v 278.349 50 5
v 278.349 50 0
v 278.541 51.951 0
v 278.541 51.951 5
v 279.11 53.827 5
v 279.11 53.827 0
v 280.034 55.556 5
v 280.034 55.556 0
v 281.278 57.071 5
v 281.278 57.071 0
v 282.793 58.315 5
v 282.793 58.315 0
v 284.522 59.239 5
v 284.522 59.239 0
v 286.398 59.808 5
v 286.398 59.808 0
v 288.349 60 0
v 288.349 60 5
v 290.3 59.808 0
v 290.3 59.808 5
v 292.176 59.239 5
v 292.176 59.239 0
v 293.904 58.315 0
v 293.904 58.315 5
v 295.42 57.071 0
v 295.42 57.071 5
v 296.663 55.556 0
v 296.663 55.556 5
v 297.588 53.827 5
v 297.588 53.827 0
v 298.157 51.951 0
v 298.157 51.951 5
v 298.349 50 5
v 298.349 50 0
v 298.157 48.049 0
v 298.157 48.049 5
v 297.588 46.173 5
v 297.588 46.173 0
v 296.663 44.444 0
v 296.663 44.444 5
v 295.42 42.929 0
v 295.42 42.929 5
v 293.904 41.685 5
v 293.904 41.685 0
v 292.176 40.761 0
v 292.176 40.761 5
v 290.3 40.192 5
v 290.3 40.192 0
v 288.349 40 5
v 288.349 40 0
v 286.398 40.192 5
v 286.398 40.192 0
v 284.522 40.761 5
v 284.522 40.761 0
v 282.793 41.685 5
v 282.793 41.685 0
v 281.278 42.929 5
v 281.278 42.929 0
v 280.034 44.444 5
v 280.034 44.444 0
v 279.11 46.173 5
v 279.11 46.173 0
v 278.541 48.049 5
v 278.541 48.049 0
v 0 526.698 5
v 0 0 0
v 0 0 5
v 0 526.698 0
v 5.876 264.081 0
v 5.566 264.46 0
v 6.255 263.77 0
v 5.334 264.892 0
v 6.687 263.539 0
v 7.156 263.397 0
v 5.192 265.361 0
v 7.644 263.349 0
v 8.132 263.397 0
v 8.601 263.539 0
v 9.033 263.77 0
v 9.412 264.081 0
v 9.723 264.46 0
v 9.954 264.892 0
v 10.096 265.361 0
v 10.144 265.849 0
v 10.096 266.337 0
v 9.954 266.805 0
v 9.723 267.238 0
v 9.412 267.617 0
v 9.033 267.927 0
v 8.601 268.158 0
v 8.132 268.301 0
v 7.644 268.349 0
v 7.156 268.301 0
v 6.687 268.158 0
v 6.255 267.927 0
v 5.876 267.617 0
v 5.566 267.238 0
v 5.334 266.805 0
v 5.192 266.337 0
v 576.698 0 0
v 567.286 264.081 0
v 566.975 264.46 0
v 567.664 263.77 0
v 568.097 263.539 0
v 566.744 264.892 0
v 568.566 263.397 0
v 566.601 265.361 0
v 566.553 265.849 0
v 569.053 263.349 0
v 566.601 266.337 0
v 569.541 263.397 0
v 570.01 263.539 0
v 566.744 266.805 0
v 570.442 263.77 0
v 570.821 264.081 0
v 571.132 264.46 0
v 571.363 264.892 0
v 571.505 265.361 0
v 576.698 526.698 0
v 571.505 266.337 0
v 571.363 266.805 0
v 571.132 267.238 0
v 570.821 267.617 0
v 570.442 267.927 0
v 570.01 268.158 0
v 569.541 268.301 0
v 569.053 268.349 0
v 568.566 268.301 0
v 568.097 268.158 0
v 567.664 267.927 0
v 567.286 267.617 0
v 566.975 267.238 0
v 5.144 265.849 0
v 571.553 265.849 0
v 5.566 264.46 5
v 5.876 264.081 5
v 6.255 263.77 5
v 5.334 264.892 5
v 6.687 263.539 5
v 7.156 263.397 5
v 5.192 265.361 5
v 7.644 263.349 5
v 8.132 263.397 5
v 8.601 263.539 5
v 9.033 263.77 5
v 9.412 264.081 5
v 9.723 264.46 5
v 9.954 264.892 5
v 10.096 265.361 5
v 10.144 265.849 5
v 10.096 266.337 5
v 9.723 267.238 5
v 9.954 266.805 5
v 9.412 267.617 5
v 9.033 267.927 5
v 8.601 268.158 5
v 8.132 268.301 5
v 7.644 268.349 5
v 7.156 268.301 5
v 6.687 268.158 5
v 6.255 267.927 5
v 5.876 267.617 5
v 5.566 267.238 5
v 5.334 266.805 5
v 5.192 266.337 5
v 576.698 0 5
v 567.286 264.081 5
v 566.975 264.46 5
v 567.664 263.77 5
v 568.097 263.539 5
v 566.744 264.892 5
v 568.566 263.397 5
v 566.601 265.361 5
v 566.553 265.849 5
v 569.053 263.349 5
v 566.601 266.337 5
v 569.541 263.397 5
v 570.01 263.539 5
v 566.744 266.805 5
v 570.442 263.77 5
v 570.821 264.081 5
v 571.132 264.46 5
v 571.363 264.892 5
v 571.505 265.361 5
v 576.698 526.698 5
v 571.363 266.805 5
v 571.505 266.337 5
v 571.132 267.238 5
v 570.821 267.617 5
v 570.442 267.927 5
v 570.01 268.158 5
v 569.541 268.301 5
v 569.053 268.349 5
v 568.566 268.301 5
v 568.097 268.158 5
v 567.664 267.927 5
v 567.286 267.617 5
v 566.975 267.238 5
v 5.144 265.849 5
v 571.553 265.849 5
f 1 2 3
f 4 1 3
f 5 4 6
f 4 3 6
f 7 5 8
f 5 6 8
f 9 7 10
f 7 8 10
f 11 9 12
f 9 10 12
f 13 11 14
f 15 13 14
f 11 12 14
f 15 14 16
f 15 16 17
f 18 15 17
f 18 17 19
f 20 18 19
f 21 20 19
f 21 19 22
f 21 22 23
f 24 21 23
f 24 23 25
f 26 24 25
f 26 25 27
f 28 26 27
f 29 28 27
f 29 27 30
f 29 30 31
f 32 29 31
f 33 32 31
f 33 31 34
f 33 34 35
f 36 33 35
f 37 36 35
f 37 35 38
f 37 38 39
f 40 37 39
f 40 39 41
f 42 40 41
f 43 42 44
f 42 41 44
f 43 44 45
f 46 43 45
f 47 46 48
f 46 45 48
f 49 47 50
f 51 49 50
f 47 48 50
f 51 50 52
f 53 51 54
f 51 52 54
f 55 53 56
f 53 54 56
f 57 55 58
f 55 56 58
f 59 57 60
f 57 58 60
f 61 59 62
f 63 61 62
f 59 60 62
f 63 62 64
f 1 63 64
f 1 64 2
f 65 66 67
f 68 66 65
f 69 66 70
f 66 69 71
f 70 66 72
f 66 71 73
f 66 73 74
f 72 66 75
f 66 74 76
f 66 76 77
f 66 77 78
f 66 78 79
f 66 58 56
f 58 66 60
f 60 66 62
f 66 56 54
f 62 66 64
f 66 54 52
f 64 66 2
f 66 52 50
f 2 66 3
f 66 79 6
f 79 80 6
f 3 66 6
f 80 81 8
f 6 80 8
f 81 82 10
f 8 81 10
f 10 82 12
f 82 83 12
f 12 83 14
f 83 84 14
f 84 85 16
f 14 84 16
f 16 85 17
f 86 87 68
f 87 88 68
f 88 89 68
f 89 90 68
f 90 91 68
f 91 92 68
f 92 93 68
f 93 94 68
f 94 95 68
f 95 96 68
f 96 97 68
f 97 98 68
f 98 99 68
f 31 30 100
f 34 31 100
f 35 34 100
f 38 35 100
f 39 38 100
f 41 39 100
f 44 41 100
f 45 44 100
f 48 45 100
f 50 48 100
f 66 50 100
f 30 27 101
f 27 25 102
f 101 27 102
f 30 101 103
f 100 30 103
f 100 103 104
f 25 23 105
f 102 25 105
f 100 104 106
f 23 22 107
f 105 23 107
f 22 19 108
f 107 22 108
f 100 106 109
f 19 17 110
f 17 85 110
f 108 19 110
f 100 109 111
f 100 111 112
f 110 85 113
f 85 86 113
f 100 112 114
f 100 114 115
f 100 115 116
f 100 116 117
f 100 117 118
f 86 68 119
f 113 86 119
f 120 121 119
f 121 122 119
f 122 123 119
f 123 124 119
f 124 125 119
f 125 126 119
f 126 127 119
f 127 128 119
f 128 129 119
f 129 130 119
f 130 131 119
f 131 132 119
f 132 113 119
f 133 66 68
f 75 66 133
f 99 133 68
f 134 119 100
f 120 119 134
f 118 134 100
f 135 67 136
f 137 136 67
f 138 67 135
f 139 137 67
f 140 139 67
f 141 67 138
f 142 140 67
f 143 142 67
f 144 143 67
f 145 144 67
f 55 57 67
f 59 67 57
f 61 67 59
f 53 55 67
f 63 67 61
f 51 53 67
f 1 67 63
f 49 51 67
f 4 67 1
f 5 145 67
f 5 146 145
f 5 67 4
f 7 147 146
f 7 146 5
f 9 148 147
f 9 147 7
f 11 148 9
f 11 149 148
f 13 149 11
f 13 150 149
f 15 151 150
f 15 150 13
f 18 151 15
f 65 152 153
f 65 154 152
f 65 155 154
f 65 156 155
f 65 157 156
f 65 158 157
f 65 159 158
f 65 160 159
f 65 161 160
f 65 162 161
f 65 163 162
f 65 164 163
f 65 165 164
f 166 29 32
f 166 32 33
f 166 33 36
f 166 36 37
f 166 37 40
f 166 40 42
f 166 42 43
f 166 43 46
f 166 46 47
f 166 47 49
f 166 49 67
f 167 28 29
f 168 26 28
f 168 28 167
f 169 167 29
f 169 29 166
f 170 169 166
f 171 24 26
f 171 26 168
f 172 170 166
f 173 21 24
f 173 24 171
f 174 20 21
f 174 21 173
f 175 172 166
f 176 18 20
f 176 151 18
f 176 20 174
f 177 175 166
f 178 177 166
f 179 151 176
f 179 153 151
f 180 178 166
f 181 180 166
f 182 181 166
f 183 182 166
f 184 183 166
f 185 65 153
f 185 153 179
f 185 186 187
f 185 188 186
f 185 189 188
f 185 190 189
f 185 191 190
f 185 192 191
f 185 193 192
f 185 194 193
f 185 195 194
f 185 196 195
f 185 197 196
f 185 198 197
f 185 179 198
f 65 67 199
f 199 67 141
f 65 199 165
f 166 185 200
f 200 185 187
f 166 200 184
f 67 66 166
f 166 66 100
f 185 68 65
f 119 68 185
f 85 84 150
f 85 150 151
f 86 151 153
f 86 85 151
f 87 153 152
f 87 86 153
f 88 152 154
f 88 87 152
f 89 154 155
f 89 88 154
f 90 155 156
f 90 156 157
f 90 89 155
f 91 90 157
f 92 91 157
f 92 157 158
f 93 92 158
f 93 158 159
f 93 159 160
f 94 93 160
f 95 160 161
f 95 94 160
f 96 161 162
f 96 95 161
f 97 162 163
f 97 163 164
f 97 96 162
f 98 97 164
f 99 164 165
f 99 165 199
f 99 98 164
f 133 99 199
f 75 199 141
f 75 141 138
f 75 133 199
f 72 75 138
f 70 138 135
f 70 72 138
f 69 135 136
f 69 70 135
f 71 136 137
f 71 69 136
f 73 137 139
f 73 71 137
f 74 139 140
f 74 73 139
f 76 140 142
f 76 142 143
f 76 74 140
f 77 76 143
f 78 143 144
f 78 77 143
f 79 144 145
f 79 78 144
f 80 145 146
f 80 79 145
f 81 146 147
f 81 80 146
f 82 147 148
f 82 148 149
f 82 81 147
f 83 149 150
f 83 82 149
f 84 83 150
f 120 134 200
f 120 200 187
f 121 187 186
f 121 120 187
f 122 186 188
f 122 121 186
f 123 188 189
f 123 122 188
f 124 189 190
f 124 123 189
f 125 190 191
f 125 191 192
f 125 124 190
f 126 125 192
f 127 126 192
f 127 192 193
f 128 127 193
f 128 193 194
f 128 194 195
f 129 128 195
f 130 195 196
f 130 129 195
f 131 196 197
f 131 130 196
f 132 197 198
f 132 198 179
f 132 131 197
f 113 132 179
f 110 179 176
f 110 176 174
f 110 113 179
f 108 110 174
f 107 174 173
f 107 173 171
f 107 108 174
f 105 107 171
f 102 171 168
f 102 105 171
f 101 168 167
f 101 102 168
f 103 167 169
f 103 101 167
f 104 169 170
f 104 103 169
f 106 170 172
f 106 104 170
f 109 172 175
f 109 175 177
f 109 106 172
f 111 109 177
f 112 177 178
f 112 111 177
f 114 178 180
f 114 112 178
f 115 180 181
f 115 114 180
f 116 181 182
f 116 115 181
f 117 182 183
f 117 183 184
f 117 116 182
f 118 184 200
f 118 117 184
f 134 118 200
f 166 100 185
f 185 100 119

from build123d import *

# Parameters (mm, degrees)
SKETCH1_W           = 576.6975777
SKETCH1_H           = 526.6975777
SKETCH1_R           = 2.5
BOSS_EXTRUDE1_DEPTH = 5
SKETCH2_R           = 10
CUT_EXTRUDE1_DEPTH  = 10


with BuildPart() as part:
    # Sketch1 → Boss-Extrude1 (new body)
    with BuildSketch(Plane.XY):
        with Locations((288.34878885, 263.34878885)):
            Rectangle(SKETCH1_W, SKETCH1_H)
        with Locations((7.644193715, 265.84878885)):
            Circle(SKETCH1_R, mode=Mode.SUBTRACT)
        with Locations((569.053383985, 265.84878885)):
            Circle(SKETCH1_R, mode=Mode.SUBTRACT)
    extrude(amount=BOSS_EXTRUDE1_DEPTH)

    # Sketch2 → Cut-Extrude1 (cut)
    with BuildSketch(Plane(origin=(0, 0, 0), x_dir=(-1, 0, 0), z_dir=(0, 0, -1))):
        with Locations((-288.34878885, 50)):
            Circle(SKETCH2_R)
    extrude(amount=-CUT_EXTRUDE1_DEPTH, mode=Mode.SUBTRACT)


solid = part.part
